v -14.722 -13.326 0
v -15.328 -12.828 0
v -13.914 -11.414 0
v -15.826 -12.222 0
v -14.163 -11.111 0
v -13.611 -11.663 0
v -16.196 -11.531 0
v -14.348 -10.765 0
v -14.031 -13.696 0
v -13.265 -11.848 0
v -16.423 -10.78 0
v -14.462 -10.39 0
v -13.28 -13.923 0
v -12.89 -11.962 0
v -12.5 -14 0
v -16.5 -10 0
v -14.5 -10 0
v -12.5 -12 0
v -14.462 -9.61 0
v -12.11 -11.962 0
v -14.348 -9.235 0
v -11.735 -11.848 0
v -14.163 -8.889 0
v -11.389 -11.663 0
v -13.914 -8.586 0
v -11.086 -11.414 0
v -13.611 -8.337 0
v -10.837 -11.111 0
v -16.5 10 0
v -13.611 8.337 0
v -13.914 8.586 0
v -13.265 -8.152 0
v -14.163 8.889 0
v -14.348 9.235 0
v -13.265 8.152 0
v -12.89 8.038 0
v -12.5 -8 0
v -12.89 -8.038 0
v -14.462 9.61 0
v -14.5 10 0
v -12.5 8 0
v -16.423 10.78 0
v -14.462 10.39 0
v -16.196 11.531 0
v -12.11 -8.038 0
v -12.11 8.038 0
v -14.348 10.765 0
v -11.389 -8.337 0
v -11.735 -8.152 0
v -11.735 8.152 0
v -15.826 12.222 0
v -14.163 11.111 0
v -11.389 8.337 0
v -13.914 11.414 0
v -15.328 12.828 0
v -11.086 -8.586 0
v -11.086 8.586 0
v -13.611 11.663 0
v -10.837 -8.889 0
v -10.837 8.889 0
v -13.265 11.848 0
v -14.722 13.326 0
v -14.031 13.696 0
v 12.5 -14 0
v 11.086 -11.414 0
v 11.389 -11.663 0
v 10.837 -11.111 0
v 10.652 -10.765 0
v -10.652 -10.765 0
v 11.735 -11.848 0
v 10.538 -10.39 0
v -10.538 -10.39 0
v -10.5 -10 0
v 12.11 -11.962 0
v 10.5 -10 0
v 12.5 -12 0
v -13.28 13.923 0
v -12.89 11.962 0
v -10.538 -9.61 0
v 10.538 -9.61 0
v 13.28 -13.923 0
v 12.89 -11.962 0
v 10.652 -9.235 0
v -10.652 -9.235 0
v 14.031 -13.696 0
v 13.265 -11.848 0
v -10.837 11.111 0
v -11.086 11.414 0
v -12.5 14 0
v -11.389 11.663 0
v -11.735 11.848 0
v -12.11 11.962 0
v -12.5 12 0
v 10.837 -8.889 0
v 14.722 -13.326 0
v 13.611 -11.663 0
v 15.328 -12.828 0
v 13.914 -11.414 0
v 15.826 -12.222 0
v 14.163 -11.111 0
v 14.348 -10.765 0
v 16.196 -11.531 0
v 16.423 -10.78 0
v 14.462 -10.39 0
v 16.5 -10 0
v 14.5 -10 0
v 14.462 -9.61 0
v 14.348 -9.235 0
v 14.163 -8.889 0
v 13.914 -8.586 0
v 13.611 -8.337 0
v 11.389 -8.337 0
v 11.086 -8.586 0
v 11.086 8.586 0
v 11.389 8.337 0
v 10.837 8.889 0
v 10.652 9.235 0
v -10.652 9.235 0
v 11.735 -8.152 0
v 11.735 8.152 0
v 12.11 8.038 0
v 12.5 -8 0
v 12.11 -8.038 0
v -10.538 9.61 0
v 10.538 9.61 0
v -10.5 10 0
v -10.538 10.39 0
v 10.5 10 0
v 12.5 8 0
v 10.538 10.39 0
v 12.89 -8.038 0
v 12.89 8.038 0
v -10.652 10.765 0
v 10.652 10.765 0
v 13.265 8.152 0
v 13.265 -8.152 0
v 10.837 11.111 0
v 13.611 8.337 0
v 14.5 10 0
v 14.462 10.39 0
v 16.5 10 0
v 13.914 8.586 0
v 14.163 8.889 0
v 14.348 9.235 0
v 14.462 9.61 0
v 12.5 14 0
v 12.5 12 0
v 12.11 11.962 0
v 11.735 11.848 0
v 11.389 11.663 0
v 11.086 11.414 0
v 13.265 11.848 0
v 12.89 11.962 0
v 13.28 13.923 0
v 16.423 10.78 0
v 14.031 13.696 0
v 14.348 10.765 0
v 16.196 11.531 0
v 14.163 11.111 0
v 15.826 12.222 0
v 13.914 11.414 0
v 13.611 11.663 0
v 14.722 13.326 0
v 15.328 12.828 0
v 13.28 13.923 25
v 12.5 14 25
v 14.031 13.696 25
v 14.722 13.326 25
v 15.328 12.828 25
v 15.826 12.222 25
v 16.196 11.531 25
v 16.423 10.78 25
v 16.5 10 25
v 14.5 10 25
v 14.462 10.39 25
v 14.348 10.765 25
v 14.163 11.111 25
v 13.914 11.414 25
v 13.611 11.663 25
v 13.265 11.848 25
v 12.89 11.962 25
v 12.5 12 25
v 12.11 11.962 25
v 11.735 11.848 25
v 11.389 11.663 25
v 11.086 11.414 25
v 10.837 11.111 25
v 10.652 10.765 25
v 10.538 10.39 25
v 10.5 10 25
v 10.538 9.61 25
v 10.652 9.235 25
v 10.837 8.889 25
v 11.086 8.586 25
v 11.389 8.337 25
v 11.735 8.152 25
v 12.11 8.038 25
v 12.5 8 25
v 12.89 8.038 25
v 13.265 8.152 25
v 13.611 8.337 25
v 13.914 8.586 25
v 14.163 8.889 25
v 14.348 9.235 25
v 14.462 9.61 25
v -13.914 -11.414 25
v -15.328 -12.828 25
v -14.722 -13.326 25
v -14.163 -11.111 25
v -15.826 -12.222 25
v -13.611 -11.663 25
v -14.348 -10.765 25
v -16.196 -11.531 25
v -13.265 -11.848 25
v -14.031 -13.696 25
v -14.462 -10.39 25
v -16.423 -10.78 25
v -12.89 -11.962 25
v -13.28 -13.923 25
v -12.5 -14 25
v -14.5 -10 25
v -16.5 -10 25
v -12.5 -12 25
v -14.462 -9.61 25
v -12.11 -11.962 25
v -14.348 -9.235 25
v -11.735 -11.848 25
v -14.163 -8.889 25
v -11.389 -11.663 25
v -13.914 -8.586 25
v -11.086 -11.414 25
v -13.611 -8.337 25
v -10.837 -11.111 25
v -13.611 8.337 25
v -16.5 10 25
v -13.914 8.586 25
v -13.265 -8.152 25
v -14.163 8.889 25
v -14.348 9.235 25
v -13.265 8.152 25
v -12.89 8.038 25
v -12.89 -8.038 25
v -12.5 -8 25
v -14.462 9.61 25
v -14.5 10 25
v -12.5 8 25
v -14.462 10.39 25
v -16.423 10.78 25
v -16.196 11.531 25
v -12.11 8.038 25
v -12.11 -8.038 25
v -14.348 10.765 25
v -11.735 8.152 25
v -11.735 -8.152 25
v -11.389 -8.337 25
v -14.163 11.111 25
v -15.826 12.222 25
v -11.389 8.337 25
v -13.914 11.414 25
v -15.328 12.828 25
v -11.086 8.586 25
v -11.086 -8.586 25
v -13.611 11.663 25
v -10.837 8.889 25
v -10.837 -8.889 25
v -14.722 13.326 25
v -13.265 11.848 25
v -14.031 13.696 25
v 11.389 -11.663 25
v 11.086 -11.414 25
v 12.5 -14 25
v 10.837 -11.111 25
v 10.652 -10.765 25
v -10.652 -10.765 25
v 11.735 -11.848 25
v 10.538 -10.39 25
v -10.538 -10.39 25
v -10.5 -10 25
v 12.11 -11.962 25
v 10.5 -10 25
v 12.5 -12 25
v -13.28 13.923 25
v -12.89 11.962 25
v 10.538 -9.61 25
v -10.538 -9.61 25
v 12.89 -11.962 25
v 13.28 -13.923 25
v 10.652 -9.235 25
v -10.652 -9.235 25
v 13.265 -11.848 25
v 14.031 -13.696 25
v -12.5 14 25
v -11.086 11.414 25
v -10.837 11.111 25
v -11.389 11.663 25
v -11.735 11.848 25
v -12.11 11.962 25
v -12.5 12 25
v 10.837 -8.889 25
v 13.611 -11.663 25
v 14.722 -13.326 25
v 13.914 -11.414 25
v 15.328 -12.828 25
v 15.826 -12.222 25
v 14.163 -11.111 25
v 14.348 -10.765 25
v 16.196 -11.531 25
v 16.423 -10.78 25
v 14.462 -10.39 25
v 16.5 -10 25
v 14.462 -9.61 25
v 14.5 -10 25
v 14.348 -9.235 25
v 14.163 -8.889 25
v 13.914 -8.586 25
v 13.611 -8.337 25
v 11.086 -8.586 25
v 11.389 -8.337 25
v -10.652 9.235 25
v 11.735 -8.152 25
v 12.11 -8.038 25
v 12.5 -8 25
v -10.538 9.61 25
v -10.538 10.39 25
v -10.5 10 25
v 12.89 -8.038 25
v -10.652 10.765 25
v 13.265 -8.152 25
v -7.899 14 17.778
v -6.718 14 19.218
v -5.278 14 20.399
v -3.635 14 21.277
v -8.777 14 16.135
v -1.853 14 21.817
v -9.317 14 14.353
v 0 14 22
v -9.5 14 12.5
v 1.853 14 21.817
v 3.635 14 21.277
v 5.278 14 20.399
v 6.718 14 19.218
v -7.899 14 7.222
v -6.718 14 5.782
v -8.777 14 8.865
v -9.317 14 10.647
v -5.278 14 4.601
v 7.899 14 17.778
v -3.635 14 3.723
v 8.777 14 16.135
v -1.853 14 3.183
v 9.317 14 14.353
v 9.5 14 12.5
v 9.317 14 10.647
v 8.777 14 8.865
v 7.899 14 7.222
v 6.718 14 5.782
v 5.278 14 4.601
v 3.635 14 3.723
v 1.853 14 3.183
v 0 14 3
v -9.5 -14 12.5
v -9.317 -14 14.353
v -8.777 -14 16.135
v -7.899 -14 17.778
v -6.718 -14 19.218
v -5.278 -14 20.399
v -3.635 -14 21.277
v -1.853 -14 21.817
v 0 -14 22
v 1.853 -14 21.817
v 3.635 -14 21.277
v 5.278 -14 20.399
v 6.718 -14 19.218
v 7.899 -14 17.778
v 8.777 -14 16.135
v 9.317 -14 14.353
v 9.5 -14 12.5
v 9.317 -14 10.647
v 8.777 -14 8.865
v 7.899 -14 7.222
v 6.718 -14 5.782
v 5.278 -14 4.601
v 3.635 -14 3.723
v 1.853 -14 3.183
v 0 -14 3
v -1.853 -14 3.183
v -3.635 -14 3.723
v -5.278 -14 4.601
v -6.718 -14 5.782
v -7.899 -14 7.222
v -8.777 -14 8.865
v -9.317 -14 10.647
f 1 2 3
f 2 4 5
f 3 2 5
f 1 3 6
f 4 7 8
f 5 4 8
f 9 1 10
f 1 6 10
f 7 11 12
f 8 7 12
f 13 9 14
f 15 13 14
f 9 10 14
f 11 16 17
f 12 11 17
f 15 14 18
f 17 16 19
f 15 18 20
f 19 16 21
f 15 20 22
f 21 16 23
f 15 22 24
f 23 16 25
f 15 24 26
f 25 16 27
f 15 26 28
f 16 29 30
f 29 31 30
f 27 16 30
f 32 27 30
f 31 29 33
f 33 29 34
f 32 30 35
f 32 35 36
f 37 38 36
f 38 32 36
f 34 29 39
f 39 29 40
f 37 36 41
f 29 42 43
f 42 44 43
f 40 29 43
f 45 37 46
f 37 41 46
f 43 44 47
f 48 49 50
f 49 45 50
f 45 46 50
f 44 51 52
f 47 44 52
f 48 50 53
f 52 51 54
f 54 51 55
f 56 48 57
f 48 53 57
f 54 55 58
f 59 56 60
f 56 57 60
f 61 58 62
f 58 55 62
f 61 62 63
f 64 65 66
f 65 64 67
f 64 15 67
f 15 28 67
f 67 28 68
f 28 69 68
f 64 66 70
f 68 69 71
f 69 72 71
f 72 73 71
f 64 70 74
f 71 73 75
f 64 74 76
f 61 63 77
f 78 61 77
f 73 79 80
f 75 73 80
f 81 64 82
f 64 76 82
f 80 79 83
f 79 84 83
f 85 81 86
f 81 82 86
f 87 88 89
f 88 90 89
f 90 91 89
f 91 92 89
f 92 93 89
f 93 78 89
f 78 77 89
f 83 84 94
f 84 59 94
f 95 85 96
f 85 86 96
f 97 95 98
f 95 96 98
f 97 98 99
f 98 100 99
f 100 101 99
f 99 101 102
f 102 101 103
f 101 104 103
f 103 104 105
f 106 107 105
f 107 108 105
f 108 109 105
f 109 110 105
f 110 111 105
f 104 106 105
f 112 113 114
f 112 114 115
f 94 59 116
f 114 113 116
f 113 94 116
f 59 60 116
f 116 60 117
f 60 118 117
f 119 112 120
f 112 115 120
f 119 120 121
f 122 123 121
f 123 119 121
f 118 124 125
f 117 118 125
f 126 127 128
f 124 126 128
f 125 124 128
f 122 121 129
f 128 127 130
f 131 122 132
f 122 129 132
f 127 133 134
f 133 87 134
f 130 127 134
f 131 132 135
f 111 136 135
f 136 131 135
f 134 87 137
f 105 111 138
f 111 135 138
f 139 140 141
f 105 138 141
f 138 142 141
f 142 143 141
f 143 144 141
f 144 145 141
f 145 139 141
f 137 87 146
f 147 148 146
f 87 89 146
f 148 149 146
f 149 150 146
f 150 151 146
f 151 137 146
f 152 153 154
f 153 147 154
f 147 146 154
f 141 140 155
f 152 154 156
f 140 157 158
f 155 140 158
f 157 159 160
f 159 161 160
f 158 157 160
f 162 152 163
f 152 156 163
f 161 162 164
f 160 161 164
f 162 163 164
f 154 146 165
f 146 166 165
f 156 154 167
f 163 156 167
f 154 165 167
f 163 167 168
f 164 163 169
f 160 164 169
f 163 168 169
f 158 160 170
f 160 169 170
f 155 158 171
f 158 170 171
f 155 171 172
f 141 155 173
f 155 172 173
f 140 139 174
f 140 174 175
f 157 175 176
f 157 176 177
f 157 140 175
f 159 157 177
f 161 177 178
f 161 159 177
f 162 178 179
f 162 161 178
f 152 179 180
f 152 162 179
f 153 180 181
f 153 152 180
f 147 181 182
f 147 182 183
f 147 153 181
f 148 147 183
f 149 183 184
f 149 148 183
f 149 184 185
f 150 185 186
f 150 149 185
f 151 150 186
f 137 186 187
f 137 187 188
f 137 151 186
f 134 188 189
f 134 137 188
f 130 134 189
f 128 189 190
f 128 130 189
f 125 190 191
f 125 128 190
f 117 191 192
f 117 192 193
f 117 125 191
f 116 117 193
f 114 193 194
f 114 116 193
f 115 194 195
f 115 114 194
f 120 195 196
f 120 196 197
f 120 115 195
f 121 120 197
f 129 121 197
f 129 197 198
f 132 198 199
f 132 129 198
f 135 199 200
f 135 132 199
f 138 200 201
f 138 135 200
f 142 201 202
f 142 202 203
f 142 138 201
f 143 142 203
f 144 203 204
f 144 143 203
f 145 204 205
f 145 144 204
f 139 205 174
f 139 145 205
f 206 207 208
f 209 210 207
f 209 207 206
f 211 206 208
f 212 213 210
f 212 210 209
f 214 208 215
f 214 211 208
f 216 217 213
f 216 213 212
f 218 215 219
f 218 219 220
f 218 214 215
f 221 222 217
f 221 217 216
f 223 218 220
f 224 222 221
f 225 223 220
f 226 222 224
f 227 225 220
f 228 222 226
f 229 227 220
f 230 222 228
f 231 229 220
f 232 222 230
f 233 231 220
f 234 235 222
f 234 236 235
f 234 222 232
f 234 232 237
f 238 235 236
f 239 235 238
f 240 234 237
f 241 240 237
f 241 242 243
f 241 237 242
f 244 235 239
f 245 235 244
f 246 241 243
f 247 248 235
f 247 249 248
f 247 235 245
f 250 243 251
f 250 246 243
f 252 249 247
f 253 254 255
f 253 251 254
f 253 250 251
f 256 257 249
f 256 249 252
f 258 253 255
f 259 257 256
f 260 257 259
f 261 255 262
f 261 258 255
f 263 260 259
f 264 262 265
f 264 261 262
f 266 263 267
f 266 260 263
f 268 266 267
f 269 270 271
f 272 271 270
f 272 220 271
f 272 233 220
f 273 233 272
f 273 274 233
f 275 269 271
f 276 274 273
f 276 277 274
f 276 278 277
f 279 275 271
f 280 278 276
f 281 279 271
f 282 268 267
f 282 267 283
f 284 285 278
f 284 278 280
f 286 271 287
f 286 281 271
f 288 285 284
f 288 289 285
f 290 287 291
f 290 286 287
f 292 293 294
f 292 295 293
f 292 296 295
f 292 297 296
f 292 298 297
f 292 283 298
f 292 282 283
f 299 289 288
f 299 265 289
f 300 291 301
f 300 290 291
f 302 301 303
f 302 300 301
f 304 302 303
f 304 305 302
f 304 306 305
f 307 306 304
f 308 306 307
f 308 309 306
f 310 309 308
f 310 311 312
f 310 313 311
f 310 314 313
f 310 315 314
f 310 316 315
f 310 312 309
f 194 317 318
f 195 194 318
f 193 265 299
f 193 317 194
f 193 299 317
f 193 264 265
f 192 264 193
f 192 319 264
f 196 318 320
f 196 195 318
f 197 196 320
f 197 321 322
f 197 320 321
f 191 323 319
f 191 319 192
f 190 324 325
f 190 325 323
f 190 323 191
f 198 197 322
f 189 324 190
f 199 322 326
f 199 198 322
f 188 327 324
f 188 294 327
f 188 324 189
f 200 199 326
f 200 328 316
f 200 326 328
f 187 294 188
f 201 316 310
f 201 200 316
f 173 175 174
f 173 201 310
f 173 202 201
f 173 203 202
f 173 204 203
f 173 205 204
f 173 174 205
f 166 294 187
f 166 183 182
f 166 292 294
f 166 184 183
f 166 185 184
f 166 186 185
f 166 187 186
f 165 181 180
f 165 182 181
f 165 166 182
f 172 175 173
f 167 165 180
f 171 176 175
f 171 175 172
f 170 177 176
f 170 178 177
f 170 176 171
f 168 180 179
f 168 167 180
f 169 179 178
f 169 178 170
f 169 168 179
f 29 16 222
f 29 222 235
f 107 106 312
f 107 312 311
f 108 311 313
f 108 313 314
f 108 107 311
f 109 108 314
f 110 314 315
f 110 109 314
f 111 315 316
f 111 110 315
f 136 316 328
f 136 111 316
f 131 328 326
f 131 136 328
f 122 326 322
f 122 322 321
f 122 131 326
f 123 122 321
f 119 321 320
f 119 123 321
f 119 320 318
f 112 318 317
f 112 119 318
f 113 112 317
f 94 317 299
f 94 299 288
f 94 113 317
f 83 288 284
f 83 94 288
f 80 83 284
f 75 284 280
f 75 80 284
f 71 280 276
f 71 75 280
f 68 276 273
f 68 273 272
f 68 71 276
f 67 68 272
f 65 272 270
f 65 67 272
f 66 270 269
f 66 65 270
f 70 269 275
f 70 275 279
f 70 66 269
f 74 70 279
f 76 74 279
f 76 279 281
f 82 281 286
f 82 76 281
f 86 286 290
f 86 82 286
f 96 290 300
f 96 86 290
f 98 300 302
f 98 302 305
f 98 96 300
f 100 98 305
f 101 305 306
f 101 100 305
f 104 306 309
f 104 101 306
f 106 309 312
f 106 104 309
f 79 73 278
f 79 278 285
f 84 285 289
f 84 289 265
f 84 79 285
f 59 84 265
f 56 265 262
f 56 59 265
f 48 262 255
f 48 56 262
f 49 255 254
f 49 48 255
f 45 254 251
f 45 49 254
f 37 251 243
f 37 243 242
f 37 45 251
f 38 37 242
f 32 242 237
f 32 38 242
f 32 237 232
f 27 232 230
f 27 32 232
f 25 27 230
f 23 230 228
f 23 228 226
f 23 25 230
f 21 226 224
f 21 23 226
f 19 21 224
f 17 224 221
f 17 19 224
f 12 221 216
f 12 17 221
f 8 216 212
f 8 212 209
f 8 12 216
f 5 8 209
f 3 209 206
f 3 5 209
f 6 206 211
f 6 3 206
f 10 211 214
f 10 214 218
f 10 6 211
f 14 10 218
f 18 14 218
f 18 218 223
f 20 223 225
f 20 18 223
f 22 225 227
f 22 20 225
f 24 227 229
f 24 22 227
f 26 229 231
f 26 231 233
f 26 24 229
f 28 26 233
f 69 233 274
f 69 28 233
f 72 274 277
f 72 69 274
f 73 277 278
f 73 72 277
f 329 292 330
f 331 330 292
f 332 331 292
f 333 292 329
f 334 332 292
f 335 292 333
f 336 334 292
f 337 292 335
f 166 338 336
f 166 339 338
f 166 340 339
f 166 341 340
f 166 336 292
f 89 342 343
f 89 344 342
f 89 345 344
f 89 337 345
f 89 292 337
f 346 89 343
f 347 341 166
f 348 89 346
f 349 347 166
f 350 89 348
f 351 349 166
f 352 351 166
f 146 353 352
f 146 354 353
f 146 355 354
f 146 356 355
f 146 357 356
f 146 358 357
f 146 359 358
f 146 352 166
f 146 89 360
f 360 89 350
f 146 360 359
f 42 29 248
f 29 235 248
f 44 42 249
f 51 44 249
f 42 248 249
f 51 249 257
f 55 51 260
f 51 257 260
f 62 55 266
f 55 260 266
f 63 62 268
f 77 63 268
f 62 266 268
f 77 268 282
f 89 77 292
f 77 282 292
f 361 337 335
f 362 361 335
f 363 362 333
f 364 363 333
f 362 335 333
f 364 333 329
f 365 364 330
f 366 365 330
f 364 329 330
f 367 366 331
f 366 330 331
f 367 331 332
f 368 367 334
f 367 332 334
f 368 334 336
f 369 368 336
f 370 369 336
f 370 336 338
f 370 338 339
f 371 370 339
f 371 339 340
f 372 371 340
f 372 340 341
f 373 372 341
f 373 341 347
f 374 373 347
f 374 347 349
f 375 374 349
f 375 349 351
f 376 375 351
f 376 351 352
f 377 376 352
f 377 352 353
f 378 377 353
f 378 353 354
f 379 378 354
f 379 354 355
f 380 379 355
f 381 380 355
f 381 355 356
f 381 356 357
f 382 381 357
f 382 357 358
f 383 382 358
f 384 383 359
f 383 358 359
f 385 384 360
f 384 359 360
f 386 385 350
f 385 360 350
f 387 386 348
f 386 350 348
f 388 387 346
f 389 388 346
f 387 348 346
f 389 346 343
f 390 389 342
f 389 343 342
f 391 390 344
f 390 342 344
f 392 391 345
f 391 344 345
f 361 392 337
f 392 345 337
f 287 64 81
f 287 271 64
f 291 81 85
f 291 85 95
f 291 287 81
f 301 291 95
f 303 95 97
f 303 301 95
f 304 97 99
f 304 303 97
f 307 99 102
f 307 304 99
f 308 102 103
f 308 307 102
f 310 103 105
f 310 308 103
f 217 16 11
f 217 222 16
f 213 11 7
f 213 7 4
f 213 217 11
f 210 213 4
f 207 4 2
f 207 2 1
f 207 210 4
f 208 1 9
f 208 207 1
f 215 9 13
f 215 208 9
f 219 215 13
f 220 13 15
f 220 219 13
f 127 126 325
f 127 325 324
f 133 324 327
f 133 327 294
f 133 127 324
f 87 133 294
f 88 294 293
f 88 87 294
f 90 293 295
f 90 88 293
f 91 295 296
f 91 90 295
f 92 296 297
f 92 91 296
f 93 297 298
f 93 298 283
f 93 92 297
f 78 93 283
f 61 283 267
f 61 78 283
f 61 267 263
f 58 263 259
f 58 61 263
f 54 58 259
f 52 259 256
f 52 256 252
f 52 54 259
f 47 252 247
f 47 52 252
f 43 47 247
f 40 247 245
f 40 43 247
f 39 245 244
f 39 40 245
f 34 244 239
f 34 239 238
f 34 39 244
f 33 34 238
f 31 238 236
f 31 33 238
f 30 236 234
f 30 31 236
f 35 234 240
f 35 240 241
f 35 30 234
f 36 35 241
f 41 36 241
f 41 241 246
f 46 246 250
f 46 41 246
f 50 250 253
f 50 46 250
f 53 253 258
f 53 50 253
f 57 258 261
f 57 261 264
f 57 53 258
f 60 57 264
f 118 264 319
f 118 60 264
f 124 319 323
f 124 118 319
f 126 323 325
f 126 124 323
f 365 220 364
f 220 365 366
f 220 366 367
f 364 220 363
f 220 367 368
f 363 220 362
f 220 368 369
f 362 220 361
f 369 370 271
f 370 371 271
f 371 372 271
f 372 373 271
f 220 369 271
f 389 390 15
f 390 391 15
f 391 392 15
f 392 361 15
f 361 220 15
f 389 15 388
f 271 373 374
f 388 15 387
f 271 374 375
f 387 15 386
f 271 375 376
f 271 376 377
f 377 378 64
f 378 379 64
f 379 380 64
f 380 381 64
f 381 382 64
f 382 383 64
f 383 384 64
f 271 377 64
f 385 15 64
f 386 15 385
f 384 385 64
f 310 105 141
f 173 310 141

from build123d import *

# Parameters (mm, degrees)
SKETCH_1_W          = 33
SKETCH_1_H          = 28
SKETCH_1_R          = 2
EXTRUDE_1_DEPTH     = 25
FILLET_1_R          = 4
SKETCH_2_R          = 9.5
CUT_EXTRUDE_1_DEPTH = 42.003048667


with BuildPart() as part:
    # 草图1 → 凸台-拉伸1 (new body)
    with BuildSketch(Plane.XY):
        Rectangle(SKETCH_1_W, SKETCH_1_H)
        with Locations((12.5, -10)):
            Circle(SKETCH_1_R, mode=Mode.SUBTRACT)
        with Locations((-12.5, -10)):
            Circle(SKETCH_1_R, mode=Mode.SUBTRACT)
        with Locations((-12.5, 10)):
            Circle(SKETCH_1_R, mode=Mode.SUBTRACT)
        with Locations((12.5, 10)):
            Circle(SKETCH_1_R, mode=Mode.SUBTRACT)
    extrude(amount=EXTRUDE_1_DEPTH)

    # 圆角1
    fillet_1_edges = [part.edges().sort_by_distance(p)[0] for p in [
        (16.5, -14, 12.5),
        (-16.5, -14, 12.5),
        (-16.5, 14, 12.5),
        (16.5, 14, 12.5),
    ]]
    fillet(fillet_1_edges, radius=FILLET_1_R)

    # 草图2 → 切除-拉伸1 (cut, through all)
    with BuildSketch(Plane(origin=(0, 14, 0), x_dir=(1, 0, 0), z_dir=(0, 1, 0))):
        with Locations(Location((0, -12.5, 0), (0, 0, 180))):
            Circle(SKETCH_2_R)
    extrude(amount=-CUT_EXTRUDE_1_DEPTH, mode=Mode.SUBTRACT)


solid = part.part
